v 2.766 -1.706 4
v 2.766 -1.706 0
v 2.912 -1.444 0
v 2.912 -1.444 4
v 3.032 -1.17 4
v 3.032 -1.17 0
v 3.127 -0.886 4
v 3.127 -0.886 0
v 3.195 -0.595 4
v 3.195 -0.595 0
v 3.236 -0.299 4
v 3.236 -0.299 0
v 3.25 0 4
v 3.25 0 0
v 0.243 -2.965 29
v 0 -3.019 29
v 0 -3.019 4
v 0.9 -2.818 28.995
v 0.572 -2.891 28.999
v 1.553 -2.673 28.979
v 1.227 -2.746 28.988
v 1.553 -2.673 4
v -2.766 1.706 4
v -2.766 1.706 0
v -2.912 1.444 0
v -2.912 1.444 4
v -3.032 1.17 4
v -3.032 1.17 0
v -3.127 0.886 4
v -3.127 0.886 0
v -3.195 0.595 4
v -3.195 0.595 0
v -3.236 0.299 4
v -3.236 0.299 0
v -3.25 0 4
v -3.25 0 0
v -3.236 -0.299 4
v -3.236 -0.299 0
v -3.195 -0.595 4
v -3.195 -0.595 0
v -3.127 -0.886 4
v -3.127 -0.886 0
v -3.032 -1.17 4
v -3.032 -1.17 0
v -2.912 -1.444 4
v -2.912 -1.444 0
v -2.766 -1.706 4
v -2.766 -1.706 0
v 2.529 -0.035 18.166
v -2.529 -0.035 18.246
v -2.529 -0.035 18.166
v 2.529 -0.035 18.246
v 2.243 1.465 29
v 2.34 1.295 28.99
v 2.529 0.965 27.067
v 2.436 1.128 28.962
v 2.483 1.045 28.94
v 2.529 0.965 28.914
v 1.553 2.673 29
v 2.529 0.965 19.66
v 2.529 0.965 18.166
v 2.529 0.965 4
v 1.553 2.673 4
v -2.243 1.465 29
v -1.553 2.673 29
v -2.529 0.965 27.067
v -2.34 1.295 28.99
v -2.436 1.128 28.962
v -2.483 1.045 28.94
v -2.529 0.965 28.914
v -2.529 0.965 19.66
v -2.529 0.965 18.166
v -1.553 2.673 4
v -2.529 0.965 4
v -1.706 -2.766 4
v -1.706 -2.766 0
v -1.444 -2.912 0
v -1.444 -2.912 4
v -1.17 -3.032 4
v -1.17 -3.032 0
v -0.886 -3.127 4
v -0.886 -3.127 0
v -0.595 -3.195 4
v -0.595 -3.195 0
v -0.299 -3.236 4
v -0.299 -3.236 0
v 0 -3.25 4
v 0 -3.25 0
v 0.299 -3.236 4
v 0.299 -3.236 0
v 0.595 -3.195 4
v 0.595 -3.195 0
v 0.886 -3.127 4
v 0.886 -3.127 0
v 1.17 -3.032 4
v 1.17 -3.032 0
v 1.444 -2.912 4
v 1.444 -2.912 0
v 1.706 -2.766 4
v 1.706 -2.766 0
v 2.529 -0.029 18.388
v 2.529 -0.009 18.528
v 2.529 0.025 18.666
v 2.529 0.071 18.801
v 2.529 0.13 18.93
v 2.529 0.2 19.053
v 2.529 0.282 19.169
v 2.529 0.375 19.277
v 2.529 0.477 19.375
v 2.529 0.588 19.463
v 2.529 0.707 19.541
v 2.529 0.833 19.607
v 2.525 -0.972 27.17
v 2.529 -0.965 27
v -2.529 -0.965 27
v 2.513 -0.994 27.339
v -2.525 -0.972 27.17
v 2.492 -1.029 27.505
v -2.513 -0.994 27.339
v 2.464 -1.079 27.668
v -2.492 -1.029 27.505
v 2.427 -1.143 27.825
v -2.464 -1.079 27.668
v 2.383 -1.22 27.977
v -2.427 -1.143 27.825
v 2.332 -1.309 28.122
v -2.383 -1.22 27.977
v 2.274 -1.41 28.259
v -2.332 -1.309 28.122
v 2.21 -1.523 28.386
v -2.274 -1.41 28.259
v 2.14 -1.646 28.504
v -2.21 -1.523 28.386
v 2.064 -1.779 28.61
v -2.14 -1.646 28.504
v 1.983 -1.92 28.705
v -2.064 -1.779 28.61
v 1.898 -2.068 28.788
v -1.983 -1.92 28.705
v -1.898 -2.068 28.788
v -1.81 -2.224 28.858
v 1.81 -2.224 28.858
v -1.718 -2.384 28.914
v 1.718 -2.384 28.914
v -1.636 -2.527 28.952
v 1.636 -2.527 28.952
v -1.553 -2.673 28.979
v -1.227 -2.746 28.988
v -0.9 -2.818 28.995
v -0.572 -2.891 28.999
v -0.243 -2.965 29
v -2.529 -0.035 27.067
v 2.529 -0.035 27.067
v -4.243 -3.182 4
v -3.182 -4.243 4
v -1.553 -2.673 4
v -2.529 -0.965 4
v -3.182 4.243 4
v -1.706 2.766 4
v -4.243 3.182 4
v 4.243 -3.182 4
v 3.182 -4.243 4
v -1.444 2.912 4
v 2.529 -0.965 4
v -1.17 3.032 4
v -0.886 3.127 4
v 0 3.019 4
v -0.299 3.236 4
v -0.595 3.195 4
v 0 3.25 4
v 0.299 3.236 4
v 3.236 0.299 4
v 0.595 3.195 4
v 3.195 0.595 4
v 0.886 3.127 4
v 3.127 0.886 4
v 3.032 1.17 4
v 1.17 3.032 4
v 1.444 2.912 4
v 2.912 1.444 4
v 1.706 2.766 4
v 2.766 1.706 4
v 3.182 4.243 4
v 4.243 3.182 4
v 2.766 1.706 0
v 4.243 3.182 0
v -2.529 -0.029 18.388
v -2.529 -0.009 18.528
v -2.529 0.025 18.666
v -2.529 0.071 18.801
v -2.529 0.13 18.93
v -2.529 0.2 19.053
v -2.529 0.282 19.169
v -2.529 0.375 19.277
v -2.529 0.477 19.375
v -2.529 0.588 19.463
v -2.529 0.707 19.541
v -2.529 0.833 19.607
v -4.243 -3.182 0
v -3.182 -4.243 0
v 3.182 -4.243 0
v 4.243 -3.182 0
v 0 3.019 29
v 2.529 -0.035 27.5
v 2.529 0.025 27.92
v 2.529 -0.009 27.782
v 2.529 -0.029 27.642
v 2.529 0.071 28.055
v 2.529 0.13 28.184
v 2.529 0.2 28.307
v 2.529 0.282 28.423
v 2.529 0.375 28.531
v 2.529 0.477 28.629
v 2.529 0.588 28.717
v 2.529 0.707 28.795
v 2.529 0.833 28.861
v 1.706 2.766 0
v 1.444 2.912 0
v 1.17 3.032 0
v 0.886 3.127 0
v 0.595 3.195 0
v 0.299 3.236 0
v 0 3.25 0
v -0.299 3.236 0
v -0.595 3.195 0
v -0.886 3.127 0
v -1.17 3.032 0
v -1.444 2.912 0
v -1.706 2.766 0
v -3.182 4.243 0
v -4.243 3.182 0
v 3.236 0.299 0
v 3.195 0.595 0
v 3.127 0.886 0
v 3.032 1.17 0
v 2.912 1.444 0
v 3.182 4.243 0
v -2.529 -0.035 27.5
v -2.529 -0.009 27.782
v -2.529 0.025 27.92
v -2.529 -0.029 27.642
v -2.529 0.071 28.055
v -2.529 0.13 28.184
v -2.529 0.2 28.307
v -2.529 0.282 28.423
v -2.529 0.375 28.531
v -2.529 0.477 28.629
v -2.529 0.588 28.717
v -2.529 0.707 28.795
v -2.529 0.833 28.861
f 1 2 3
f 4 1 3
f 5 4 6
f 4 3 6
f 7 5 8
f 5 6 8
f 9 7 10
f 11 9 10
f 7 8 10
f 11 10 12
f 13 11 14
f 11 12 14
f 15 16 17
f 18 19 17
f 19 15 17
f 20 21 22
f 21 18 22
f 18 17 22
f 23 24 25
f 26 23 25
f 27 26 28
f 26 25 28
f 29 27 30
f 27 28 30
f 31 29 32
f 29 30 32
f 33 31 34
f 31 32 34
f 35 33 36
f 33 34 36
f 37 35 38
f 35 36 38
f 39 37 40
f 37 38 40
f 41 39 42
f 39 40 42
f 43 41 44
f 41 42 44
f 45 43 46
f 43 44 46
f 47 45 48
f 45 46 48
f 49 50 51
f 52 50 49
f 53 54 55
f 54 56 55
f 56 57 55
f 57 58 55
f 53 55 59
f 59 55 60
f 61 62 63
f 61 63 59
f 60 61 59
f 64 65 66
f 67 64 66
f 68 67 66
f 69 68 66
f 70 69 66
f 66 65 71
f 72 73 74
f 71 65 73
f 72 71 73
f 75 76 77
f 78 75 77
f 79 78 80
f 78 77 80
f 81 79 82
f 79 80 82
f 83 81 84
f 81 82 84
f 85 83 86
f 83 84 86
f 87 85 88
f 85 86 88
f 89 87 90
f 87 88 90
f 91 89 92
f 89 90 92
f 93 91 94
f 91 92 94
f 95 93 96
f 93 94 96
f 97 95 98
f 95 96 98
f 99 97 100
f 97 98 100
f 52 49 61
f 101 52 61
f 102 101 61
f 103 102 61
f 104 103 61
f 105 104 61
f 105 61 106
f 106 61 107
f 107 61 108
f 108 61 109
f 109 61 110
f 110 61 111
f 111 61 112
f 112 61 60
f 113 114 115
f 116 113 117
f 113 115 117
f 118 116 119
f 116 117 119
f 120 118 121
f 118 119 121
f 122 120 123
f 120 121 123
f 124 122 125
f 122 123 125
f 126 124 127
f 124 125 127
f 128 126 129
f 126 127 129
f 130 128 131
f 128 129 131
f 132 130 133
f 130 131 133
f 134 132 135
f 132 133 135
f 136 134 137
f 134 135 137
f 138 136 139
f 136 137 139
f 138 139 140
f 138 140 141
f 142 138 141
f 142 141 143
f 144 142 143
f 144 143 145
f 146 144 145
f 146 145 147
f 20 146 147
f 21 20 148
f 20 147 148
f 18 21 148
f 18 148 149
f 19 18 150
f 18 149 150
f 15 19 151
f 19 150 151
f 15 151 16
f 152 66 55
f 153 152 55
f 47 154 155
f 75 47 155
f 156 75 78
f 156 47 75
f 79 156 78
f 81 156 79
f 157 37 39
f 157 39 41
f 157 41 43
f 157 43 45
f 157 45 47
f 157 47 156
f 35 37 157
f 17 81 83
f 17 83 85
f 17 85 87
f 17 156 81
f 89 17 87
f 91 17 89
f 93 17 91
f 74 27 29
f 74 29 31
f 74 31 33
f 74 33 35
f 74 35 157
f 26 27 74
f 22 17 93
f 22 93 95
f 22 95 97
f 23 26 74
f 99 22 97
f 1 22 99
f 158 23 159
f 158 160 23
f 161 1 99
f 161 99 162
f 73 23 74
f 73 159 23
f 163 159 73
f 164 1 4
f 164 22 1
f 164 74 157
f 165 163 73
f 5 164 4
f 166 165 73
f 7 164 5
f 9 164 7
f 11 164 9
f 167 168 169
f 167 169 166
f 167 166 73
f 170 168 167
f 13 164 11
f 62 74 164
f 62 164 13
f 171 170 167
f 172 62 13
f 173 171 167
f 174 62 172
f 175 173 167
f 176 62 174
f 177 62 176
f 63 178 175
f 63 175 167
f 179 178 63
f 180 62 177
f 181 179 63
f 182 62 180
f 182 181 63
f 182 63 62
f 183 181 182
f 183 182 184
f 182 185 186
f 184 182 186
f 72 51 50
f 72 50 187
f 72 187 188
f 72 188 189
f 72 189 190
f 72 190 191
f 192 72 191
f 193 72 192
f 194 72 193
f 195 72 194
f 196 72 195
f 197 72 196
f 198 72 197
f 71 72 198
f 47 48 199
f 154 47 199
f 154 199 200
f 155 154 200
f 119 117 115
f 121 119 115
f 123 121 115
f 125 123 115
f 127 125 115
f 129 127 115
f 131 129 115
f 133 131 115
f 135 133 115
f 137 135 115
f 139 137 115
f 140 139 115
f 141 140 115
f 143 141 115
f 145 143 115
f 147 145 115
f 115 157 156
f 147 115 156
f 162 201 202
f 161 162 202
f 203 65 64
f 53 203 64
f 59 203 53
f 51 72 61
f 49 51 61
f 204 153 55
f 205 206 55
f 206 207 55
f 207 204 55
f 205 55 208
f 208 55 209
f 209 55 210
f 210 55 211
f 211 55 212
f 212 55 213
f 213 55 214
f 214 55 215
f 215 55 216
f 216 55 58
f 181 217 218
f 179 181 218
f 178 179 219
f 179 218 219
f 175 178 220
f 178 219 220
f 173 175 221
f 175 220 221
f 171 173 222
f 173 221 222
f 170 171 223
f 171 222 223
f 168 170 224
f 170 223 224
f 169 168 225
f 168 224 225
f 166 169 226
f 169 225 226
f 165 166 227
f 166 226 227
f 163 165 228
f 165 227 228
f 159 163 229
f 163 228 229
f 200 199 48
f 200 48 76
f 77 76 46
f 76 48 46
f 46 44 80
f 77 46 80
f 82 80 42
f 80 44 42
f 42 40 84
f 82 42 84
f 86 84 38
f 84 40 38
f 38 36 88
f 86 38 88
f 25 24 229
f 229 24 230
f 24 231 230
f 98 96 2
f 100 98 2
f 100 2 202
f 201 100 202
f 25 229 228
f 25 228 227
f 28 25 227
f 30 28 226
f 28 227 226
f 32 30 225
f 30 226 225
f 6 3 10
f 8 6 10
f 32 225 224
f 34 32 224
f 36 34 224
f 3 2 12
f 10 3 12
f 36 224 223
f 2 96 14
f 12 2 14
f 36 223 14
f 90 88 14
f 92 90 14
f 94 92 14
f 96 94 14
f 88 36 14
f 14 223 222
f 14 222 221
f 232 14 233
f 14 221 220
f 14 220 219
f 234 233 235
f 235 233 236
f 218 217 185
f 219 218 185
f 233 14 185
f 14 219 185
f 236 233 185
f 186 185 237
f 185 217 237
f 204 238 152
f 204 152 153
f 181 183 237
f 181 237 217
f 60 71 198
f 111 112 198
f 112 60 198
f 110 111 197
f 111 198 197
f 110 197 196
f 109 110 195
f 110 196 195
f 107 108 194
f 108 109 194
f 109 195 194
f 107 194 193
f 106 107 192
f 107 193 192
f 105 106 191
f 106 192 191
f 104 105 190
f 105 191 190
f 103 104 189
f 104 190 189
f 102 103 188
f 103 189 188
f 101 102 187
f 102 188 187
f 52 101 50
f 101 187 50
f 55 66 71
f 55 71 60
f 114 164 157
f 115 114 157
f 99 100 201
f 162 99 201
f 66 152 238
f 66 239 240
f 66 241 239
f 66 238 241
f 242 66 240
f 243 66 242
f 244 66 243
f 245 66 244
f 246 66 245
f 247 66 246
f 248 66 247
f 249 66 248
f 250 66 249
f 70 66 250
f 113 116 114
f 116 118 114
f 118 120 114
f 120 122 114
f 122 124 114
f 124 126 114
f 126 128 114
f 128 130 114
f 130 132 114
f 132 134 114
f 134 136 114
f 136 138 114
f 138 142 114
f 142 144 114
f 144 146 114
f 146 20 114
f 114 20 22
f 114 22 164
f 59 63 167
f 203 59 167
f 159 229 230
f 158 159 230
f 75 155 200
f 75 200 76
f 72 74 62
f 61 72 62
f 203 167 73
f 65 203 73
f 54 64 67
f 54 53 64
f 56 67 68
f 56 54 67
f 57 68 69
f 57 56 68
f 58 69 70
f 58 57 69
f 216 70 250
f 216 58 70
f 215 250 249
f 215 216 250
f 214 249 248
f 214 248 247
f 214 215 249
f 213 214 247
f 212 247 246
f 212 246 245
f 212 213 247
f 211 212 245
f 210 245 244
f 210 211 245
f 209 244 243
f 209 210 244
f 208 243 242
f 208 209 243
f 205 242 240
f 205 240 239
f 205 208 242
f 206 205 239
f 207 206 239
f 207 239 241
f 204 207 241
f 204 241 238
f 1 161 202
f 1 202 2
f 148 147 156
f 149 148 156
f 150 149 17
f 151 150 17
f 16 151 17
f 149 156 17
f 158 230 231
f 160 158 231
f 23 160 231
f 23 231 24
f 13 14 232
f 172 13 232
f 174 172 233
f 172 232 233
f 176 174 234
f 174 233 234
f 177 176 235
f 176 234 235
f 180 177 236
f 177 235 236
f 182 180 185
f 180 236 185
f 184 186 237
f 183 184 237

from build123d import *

# Parameters (mm, degrees)
F1_DEPTH     = 4
F3_DEPTH     = 25
F4_R         = 2
F5_W         = 5.058165174
F5_H         = 1.9329627007
F6_DEPTH     = 1
F7_R         = 1.5
F8_W         = 5.058165174
F8_H         = 1.4937128872
F9_DEPTH     = 1
F10_T1_DEPTH = 12.1292329858


# Not quite as in the source:
# - a fillet or chamfer that OpenCascade refuses, or shapes differently, is made with other operations: its cross-section is extruded or revolved along the edge and cut away or added


with BuildPart() as f1:
    # F0 (on Top) → F1 (new body)
    with BuildSketch(Plane.XY):
        with BuildLine():
            ThreePointArc((2.7663980634, -1.7057378916), (3.1267629992, -0.8864835853), (3.25, 0))
            ThreePointArc((3.25, 0), (3.1267629992, 0.8864835853), (2.7663980634, 1.7057378916))
            ThreePointArc((2.7663980634, 1.7057378916), (2.2980970389, 2.2980970389), (1.7057378916, 2.7663980634))
            ThreePointArc((1.7057378916, 2.7663980634), (0, 3.25), (-1.7057378916, 2.7663980634))
            ThreePointArc((-1.7057378916, 2.7663980634), (-2.2980970389, 2.2980970389), (-2.7663980634, 1.7057378916))
            ThreePointArc((-2.7663980634, 1.7057378916), (-3.25, 0), (-2.7663980634, -1.7057378916))
            ThreePointArc((-2.7663980634, -1.7057378916), (-2.2980970389, -2.2980970389), (-1.7057378916, -2.7663980634))
            ThreePointArc((-1.7057378916, -2.7663980634), (0, -3.25), (1.7057378916, -2.7663980634))
            ThreePointArc((1.7057378916, -2.7663980634), (2.2980970389, -2.2980970389), (2.7663980634, -1.7057378916))
        make_face()
        with BuildLine():
            ThreePointArc((1.7057378916, 2.7663980634), (2.2980970389, 2.2980970389), (2.7663980634, 1.7057378916))
            Line((2.7663980634, 1.7057378916), (4.2426406871, 3.1819805153))
            Line((4.2426406871, 3.1819805153), (3.7123106012, 3.7123106012))
            Line((3.7123106012, 3.7123106012), (3.1819805153, 4.2426406871))
            Line((3.1819805153, 4.2426406871), (1.7057378916, 2.7663980634))
        make_face()
        with BuildLine():
            Line((4.2426406871, -3.1819805153), (2.7663980634, -1.7057378916))
            ThreePointArc((2.7663980634, -1.7057378916), (2.2980970389, -2.2980970389), (1.7057378916, -2.7663980634))
            Line((1.7057378916, -2.7663980634), (3.1819805153, -4.2426406871))
            Line((3.1819805153, -4.2426406871), (3.7123106012, -3.7123106012))
            Line((3.7123106012, -3.7123106012), (4.2426406871, -3.1819805153))
        make_face()
        with BuildLine():
            ThreePointArc((-2.7663980634, 1.7057378916), (-2.2980970389, 2.2980970389), (-1.7057378916, 2.7663980634))
            Line((-1.7057378916, 2.7663980634), (-3.1819805153, 4.2426406871))
            Line((-3.1819805153, 4.2426406871), (-3.7123106012, 3.7123106012))
            Line((-3.7123106012, 3.7123106012), (-4.2426406871, 3.1819805153))
            Line((-4.2426406871, 3.1819805153), (-2.7663980634, 1.7057378916))
        make_face()
        with BuildLine():
            Line((-3.1819805153, -4.2426406871), (-1.7057378916, -2.7663980634))
            ThreePointArc((-1.7057378916, -2.7663980634), (-2.2980970389, -2.2980970389), (-2.7663980634, -1.7057378916))
            Line((-2.7663980634, -1.7057378916), (-4.2426406871, -3.1819805153))
            Line((-4.2426406871, -3.1819805153), (-3.7123106012, -3.7123106012))
            Line((-3.7123106012, -3.7123106012), (-3.1819805153, -4.2426406871))
        make_face()
    extrude(amount=F1_DEPTH)

    # F2 (on face) → F3 (join)
    with BuildSketch(Plane.XY.offset(4)):
        Polygon((-1.5528574586, 2.6730068494), (-2.529082587, 0.9646130493), (2.529082587, 0.9646130493), (1.5528574586, 2.6730068494), (0, 3.0187531374), align=None)
        Polygon((2.529082587, -0.9646130493), (-2.529082587, -0.9646130493), (-1.5528574586, -2.6730068494), (0, -3.0187531374), (1.5528574586, -2.6730068494), align=None)
    extrude(amount=F3_DEPTH)

    # F4
    f4_edges = [f1.edges().sort_by_distance(p)[0] for p in [
        (0, -0.964613, 29),
    ]]
    fillet(f4_edges, radius=F4_R)

    # F5 (on face) → F6 (join)
    with BuildSketch(Plane.XZ.offset(-0.9646130493)):
        with Locations((0, 28.0335186496)):
            Rectangle(F5_W, F5_H)
    extrude(amount=F6_DEPTH)

    # F7
    f7_edges = [f1.edges().sort_by_distance(p)[0] for p in [
        (0, -0.035387, 29),
    ]]
    fillet(f7_edges, radius=F7_R)

    # F8 (on face) → F9 (join)
    with BuildSketch(Plane.XZ.offset(-0.9646130493)):
        with Locations((0, 18.9132643864)):
            Rectangle(F8_W, F8_H)
    extrude(amount=F9_DEPTH)

    # F10: fillet of radius 1.5 on 1 edges, made by hand

    # F10_s2 → F10_t1 (cut)
    with BuildSketch(Plane.YZ.offset(-6.0646164929)):
        with BuildLine():
            ThreePointArc((0.9646130493, 19.6601208299), (0.2398681779, 19.1119326714), (-0.0353869507, 18.2459072676))
            Line((-0.0353869507, 18.2459072676), (-0.0353869507, 19.6601208299))
            Line((-0.0353869507, 19.6601208299), (0.9646130493, 19.6601208299))
        make_face()
    extrude(amount=F10_T1_DEPTH, mode=Mode.SUBTRACT)


solid = f1.part
